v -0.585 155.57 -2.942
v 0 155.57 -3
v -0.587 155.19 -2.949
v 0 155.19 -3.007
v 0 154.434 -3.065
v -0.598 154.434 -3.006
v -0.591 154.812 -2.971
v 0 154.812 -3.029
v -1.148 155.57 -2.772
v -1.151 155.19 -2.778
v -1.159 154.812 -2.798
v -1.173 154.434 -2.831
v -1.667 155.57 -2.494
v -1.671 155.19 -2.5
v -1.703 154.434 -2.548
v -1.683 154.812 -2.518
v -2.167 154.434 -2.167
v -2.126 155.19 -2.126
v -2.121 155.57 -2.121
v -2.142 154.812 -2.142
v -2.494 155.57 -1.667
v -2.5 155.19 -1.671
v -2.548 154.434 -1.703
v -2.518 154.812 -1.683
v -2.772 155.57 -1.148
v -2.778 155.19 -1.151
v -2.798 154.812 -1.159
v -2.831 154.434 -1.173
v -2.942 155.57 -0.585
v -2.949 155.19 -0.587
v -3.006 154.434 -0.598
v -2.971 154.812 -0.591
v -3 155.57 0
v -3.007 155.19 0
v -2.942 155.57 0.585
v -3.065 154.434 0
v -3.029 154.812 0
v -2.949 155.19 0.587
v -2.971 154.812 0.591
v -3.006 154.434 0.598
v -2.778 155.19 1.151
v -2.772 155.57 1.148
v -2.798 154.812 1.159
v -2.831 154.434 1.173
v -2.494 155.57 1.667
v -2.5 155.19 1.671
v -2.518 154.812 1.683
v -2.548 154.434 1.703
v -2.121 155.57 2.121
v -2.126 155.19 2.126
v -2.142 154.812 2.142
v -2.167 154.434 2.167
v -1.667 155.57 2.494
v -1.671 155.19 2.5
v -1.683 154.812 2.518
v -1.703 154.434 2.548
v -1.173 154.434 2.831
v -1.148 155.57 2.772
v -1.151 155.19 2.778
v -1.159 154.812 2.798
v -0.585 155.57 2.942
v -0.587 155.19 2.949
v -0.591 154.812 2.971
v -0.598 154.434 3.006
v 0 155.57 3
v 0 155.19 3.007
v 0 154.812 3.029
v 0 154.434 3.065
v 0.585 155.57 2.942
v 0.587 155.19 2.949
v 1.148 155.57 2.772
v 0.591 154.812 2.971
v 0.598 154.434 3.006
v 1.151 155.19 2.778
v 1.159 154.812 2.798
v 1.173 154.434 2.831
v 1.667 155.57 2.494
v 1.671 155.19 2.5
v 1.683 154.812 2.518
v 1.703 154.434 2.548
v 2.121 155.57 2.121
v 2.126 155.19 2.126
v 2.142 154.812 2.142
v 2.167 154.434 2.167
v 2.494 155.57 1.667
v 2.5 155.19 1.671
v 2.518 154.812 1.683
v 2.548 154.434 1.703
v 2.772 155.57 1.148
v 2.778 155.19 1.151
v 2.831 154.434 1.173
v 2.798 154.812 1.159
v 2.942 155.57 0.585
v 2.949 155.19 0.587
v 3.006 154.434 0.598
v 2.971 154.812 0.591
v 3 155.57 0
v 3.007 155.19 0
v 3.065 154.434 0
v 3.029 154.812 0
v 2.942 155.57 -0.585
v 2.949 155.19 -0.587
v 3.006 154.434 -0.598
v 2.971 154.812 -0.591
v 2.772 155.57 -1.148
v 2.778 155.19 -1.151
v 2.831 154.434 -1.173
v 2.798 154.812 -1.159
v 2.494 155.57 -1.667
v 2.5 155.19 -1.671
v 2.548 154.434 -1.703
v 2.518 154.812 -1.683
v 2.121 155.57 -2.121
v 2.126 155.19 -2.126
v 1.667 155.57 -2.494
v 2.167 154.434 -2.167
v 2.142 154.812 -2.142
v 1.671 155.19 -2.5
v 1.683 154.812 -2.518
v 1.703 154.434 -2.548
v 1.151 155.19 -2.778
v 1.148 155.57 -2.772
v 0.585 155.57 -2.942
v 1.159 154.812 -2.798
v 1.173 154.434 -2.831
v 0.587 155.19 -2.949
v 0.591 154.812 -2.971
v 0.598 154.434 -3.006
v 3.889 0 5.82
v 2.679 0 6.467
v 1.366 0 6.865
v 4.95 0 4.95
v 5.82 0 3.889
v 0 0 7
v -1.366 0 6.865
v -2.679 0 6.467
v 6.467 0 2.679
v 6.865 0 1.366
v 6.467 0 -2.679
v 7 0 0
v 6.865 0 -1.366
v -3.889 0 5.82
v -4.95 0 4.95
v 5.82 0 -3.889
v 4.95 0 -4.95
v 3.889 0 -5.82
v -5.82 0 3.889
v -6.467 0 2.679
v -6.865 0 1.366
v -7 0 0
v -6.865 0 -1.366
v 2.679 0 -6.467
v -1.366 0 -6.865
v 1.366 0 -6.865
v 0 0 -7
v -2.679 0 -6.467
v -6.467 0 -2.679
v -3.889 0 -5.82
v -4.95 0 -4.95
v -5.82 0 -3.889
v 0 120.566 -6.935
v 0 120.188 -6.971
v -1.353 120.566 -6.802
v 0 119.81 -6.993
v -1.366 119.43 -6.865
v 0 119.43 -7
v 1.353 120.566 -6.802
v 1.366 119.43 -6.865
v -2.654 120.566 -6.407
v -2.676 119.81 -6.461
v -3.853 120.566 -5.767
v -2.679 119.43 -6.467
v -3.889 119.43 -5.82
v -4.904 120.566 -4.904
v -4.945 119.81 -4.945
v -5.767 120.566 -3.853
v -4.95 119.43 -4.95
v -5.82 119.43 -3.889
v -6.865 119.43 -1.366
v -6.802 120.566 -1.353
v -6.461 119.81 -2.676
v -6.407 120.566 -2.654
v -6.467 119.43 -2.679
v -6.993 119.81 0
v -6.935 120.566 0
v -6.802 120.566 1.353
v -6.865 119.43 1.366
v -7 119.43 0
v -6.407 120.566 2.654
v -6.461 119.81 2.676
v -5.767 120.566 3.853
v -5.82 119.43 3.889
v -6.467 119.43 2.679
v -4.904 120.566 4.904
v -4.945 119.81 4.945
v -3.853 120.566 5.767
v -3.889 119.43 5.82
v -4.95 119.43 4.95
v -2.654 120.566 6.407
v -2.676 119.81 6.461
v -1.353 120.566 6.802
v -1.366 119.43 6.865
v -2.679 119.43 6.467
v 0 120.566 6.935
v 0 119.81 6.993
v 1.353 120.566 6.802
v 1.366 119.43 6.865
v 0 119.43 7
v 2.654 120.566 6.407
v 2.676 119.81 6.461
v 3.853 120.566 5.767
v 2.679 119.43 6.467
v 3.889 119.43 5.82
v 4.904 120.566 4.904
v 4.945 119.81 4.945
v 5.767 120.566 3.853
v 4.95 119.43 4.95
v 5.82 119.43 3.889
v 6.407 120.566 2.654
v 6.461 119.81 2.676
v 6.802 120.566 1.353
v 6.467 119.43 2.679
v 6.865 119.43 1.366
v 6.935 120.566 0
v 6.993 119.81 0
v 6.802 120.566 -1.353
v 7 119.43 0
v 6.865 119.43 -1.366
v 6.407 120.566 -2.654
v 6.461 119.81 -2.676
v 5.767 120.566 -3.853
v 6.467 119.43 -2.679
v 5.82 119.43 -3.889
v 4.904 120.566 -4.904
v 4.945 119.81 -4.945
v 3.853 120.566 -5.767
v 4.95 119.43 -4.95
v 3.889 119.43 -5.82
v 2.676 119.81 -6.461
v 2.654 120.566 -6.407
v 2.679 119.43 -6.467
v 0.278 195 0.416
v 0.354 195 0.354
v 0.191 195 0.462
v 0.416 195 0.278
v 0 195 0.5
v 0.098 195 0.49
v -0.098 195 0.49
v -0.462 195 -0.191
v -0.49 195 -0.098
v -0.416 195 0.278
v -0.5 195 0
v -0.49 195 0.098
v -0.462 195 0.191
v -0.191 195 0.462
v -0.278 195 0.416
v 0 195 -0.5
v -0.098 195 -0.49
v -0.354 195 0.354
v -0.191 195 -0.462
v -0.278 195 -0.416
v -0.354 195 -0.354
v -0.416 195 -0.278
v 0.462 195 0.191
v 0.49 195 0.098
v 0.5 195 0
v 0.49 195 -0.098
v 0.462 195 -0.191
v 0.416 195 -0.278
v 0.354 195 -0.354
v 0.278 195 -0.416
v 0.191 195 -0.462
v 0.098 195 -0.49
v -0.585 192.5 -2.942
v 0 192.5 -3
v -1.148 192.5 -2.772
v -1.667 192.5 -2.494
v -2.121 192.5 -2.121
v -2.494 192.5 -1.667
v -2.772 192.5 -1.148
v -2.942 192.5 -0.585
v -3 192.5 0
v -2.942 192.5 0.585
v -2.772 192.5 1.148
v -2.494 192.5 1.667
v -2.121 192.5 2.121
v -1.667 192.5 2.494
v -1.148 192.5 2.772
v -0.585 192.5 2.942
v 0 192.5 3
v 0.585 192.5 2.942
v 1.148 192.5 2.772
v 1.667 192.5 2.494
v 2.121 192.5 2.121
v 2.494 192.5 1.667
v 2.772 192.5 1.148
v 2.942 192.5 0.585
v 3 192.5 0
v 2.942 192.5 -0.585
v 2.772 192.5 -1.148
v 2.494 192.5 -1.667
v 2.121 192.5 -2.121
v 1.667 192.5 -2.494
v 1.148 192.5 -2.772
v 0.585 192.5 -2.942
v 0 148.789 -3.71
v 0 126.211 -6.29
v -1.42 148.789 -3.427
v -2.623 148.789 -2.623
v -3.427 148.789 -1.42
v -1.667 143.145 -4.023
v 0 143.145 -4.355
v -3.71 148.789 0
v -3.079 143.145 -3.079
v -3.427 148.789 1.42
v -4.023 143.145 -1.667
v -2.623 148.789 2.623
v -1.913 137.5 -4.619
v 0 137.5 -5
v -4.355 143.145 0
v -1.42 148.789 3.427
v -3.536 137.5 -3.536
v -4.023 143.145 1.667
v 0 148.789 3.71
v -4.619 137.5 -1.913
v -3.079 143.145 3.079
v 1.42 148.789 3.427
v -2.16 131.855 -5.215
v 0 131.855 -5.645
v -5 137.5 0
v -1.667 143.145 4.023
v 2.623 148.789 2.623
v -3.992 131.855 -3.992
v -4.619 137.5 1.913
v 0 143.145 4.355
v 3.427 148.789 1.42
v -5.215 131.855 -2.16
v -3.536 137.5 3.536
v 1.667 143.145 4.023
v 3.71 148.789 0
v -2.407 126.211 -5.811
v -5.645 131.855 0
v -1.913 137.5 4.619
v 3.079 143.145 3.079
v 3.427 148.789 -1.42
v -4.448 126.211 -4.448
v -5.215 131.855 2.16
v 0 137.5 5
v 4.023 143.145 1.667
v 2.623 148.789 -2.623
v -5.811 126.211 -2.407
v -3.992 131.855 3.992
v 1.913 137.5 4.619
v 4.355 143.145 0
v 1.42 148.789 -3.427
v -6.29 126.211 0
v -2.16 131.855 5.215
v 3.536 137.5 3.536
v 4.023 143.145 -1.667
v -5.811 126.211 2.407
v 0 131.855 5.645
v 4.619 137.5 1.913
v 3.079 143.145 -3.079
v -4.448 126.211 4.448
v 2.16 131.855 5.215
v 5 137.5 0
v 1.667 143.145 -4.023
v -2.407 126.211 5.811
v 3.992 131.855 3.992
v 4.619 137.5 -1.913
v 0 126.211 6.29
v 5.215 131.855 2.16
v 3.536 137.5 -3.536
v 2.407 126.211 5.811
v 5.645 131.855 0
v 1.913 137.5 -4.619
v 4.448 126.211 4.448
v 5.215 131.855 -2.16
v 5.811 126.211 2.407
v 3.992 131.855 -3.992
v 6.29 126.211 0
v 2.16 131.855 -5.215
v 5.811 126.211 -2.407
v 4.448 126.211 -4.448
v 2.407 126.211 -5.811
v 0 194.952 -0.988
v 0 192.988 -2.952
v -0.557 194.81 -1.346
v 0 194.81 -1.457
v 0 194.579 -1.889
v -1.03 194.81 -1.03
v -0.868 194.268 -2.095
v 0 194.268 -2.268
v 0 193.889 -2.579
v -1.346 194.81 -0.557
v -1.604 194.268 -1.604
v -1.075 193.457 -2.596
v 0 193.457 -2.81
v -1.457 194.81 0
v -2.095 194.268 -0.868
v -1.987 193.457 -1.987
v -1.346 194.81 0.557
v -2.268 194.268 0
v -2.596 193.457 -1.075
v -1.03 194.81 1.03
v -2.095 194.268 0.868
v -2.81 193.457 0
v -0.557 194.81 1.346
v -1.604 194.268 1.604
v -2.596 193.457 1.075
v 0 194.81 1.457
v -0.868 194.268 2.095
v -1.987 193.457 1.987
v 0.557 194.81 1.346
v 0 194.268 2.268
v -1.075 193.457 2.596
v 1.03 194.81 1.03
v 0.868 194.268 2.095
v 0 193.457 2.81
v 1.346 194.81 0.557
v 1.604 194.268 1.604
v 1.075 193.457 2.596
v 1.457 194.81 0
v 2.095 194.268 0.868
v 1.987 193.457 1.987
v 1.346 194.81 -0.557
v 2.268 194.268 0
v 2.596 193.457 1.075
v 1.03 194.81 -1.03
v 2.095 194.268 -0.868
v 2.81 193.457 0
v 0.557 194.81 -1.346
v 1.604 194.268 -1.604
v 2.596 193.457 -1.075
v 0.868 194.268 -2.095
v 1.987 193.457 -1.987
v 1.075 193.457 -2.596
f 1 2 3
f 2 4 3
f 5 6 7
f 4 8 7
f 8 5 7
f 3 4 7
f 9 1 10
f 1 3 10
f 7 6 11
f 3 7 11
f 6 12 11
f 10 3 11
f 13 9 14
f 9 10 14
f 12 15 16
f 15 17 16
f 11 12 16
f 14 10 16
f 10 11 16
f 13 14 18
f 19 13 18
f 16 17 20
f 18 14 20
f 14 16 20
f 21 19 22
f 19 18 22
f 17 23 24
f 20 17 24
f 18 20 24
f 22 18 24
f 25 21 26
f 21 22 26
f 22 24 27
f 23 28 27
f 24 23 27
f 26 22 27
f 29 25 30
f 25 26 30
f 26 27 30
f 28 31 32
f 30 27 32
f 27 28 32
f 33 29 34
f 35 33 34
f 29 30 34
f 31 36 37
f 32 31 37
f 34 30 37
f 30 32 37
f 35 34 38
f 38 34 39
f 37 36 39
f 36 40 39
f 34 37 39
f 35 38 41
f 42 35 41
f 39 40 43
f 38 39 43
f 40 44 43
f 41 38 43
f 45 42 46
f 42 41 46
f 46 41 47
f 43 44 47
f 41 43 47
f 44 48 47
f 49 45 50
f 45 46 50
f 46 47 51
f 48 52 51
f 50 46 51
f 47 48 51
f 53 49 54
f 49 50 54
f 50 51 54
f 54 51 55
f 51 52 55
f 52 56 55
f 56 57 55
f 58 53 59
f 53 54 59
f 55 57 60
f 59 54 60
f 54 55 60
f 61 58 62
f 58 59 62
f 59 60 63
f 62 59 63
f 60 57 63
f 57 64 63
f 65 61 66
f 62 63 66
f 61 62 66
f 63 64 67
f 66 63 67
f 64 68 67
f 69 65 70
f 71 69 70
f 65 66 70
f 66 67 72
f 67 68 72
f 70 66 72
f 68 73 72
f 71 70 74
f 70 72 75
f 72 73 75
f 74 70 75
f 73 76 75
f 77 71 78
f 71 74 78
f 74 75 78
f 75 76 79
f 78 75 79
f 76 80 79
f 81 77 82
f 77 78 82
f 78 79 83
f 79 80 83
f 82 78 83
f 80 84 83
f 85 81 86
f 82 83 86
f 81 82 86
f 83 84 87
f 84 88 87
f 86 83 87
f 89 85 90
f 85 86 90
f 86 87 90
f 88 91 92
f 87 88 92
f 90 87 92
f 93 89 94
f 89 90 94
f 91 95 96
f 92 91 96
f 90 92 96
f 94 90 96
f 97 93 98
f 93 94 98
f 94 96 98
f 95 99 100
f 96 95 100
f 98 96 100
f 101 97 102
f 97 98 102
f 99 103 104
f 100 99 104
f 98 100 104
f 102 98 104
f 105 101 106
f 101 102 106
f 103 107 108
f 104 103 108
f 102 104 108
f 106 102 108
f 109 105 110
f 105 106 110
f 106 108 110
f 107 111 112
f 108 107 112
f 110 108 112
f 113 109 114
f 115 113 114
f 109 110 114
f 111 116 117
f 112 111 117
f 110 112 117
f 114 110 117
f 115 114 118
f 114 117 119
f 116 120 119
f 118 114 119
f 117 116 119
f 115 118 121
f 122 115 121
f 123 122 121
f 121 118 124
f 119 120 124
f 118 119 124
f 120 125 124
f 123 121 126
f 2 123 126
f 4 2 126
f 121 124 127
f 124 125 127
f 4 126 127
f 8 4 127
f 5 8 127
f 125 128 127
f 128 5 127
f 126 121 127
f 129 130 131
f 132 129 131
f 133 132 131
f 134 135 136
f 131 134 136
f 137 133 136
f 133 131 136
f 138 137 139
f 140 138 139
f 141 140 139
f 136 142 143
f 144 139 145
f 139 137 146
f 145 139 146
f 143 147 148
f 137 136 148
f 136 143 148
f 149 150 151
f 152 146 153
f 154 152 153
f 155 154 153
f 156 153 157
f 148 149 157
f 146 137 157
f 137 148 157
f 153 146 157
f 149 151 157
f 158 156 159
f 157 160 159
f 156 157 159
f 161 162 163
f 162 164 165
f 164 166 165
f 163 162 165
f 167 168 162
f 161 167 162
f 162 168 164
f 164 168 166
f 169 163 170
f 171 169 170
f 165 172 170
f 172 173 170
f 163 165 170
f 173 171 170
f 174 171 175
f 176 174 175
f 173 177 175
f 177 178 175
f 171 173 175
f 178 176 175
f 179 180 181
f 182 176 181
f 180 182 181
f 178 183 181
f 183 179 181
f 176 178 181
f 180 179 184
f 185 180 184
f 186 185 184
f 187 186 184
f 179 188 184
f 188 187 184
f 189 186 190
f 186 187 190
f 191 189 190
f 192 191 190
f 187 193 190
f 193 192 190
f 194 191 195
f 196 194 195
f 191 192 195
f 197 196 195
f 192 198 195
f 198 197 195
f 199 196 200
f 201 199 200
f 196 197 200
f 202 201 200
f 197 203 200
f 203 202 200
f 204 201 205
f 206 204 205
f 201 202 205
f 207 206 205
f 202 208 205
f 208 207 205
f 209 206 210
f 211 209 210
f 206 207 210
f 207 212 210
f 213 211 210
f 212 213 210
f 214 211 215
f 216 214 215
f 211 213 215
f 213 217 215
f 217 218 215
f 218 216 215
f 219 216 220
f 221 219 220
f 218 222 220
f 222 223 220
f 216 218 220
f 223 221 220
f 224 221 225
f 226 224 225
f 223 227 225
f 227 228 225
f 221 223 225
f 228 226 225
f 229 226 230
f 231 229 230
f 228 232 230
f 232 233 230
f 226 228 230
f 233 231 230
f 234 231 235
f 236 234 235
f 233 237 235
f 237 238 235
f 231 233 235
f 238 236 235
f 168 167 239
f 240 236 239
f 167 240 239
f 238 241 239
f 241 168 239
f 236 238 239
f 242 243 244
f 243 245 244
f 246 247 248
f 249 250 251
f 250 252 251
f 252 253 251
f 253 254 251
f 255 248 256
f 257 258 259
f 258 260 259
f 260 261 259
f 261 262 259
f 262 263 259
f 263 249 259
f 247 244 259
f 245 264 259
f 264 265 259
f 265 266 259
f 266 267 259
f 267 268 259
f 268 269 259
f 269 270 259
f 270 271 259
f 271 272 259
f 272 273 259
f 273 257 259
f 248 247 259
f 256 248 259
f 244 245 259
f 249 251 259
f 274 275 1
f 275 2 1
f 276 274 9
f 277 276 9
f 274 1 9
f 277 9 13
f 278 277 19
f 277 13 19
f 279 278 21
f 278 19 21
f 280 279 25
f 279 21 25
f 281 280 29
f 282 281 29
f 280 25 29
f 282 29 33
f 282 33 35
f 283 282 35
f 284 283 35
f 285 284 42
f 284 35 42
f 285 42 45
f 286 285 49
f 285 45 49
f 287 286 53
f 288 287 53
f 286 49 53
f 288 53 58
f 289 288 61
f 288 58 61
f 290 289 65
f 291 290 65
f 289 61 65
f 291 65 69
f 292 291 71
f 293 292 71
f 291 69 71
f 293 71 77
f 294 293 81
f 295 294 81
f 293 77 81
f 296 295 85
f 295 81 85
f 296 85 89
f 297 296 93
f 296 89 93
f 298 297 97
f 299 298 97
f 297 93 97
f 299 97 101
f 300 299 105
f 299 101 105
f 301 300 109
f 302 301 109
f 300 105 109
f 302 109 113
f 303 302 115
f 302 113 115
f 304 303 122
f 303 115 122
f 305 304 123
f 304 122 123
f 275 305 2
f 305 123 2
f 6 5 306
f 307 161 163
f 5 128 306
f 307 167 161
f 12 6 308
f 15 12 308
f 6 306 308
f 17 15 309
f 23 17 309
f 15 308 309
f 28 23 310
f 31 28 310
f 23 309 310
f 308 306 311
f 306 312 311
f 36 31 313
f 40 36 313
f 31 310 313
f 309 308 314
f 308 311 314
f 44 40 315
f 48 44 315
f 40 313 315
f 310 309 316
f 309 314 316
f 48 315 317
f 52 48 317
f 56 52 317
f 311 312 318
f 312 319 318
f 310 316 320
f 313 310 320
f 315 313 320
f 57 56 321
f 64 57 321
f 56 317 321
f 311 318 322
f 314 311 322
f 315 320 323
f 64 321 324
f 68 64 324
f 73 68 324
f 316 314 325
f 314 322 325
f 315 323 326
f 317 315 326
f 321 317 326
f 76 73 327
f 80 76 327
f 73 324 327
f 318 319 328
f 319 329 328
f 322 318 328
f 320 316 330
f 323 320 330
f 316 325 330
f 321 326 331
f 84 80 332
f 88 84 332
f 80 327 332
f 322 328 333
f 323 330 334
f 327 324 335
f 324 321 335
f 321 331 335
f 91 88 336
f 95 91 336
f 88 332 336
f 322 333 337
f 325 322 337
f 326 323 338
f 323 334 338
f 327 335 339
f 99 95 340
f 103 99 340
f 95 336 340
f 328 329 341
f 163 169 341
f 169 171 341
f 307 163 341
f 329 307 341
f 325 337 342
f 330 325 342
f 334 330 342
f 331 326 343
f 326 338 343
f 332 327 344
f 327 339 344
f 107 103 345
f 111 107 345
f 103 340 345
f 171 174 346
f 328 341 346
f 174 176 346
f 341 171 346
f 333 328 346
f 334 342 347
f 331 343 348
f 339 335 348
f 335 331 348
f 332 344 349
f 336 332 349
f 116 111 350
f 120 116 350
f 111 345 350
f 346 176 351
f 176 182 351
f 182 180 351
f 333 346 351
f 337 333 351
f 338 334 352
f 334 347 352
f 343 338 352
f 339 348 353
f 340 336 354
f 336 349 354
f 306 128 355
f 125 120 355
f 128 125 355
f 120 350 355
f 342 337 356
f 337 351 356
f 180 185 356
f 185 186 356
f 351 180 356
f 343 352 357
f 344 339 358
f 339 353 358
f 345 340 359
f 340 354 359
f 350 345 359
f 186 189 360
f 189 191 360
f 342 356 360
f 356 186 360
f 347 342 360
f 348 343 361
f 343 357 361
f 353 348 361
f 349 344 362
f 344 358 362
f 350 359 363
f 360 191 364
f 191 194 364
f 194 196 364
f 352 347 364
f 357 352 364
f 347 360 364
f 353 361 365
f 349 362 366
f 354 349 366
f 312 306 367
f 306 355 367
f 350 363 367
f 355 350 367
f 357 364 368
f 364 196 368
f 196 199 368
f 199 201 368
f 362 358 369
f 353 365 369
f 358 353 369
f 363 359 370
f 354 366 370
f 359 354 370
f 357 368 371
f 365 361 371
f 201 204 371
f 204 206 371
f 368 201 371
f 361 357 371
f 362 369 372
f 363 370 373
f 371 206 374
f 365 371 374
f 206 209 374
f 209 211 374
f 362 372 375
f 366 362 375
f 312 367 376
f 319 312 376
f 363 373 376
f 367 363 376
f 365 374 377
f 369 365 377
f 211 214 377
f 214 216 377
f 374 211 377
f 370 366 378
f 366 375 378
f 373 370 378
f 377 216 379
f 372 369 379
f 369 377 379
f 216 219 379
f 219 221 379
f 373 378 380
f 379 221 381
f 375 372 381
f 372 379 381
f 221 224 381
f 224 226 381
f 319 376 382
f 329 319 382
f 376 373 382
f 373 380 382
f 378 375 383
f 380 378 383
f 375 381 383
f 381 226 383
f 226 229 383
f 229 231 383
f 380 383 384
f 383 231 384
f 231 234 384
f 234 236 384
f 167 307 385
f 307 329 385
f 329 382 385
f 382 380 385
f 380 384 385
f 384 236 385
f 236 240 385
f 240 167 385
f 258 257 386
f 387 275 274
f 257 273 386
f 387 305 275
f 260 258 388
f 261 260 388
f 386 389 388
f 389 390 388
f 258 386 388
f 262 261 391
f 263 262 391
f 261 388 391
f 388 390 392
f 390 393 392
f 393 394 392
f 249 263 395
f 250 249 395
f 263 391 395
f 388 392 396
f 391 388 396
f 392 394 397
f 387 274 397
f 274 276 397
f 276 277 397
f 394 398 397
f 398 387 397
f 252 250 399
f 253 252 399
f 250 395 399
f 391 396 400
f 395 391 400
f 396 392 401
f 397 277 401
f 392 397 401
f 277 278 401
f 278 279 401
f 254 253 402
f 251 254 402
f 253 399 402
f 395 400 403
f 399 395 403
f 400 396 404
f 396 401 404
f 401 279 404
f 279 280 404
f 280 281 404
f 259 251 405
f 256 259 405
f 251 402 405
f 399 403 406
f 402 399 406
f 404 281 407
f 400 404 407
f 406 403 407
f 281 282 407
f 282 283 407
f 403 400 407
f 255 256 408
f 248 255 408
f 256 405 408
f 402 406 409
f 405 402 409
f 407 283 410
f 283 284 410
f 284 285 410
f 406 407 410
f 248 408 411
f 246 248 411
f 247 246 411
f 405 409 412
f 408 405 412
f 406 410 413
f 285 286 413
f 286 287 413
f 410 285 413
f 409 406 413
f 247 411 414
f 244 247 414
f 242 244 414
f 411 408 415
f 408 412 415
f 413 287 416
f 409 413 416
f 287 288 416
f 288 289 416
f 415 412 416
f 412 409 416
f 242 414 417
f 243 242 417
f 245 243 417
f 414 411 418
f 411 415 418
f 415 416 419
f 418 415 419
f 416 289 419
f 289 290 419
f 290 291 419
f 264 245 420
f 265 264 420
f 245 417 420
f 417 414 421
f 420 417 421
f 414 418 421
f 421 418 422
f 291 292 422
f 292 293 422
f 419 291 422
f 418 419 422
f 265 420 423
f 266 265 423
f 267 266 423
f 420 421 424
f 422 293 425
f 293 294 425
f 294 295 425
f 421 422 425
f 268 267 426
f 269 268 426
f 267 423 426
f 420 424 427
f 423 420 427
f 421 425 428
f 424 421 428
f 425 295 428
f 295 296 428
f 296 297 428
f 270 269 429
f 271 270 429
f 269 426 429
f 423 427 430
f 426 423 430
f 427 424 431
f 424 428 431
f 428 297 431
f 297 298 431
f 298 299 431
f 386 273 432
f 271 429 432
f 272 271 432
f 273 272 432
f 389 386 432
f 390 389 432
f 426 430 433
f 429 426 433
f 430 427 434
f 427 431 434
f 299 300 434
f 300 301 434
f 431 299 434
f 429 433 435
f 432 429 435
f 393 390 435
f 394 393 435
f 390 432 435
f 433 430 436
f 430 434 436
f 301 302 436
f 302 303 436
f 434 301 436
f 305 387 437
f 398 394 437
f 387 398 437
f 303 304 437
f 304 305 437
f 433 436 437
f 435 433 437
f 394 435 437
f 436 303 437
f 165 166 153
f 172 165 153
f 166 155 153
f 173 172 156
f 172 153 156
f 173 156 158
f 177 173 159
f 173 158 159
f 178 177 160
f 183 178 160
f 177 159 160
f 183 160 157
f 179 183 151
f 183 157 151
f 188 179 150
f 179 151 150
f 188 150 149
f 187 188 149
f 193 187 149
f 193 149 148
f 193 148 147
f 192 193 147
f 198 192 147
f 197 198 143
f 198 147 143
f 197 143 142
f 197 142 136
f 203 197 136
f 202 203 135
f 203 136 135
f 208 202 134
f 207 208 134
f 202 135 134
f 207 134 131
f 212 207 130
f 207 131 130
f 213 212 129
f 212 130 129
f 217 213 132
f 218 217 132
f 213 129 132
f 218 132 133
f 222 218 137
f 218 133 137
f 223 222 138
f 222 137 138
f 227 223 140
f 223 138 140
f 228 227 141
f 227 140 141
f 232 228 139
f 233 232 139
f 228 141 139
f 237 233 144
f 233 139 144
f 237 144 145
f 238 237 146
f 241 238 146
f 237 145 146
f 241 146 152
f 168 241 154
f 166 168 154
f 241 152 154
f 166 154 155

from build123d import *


with BuildPart() as part:
    # Sketch2 → Antenna (revolve)
    with BuildSketch(Plane.XY, mode=Mode.PRIVATE) as antenna_sk:
        with BuildLine():
            Line((3, 192.5), (3, 155.569574769))
            ThreePointArc((3, 155.569574769), (3.01618141, 155.000921652), (3.064673273, 154.434108857))
            Line((3.064673273, 154.434108857), (6.935326727, 120.565891143))
            ThreePointArc((6.935326727, 120.565891143), (6.98381859, 119.999078348), (7, 119.430425231))
            Line((7, 119.430425231), (7, 0))
            Line((7, 0), (0, 0))
            Line((0, 0), (0, 195))
            Line((0, 195), (0.5, 195))
            ThreePointArc((0.5, 195), (2.267766953, 194.267766953), (3, 192.5))
        make_face()
    revolve(antenna_sk.sketch.rotate(Axis((0, 0, 0), (0, 1, 0)), 90), axis=Axis((0, 0, 0), (0, 1, 0)))


solid = part.part
